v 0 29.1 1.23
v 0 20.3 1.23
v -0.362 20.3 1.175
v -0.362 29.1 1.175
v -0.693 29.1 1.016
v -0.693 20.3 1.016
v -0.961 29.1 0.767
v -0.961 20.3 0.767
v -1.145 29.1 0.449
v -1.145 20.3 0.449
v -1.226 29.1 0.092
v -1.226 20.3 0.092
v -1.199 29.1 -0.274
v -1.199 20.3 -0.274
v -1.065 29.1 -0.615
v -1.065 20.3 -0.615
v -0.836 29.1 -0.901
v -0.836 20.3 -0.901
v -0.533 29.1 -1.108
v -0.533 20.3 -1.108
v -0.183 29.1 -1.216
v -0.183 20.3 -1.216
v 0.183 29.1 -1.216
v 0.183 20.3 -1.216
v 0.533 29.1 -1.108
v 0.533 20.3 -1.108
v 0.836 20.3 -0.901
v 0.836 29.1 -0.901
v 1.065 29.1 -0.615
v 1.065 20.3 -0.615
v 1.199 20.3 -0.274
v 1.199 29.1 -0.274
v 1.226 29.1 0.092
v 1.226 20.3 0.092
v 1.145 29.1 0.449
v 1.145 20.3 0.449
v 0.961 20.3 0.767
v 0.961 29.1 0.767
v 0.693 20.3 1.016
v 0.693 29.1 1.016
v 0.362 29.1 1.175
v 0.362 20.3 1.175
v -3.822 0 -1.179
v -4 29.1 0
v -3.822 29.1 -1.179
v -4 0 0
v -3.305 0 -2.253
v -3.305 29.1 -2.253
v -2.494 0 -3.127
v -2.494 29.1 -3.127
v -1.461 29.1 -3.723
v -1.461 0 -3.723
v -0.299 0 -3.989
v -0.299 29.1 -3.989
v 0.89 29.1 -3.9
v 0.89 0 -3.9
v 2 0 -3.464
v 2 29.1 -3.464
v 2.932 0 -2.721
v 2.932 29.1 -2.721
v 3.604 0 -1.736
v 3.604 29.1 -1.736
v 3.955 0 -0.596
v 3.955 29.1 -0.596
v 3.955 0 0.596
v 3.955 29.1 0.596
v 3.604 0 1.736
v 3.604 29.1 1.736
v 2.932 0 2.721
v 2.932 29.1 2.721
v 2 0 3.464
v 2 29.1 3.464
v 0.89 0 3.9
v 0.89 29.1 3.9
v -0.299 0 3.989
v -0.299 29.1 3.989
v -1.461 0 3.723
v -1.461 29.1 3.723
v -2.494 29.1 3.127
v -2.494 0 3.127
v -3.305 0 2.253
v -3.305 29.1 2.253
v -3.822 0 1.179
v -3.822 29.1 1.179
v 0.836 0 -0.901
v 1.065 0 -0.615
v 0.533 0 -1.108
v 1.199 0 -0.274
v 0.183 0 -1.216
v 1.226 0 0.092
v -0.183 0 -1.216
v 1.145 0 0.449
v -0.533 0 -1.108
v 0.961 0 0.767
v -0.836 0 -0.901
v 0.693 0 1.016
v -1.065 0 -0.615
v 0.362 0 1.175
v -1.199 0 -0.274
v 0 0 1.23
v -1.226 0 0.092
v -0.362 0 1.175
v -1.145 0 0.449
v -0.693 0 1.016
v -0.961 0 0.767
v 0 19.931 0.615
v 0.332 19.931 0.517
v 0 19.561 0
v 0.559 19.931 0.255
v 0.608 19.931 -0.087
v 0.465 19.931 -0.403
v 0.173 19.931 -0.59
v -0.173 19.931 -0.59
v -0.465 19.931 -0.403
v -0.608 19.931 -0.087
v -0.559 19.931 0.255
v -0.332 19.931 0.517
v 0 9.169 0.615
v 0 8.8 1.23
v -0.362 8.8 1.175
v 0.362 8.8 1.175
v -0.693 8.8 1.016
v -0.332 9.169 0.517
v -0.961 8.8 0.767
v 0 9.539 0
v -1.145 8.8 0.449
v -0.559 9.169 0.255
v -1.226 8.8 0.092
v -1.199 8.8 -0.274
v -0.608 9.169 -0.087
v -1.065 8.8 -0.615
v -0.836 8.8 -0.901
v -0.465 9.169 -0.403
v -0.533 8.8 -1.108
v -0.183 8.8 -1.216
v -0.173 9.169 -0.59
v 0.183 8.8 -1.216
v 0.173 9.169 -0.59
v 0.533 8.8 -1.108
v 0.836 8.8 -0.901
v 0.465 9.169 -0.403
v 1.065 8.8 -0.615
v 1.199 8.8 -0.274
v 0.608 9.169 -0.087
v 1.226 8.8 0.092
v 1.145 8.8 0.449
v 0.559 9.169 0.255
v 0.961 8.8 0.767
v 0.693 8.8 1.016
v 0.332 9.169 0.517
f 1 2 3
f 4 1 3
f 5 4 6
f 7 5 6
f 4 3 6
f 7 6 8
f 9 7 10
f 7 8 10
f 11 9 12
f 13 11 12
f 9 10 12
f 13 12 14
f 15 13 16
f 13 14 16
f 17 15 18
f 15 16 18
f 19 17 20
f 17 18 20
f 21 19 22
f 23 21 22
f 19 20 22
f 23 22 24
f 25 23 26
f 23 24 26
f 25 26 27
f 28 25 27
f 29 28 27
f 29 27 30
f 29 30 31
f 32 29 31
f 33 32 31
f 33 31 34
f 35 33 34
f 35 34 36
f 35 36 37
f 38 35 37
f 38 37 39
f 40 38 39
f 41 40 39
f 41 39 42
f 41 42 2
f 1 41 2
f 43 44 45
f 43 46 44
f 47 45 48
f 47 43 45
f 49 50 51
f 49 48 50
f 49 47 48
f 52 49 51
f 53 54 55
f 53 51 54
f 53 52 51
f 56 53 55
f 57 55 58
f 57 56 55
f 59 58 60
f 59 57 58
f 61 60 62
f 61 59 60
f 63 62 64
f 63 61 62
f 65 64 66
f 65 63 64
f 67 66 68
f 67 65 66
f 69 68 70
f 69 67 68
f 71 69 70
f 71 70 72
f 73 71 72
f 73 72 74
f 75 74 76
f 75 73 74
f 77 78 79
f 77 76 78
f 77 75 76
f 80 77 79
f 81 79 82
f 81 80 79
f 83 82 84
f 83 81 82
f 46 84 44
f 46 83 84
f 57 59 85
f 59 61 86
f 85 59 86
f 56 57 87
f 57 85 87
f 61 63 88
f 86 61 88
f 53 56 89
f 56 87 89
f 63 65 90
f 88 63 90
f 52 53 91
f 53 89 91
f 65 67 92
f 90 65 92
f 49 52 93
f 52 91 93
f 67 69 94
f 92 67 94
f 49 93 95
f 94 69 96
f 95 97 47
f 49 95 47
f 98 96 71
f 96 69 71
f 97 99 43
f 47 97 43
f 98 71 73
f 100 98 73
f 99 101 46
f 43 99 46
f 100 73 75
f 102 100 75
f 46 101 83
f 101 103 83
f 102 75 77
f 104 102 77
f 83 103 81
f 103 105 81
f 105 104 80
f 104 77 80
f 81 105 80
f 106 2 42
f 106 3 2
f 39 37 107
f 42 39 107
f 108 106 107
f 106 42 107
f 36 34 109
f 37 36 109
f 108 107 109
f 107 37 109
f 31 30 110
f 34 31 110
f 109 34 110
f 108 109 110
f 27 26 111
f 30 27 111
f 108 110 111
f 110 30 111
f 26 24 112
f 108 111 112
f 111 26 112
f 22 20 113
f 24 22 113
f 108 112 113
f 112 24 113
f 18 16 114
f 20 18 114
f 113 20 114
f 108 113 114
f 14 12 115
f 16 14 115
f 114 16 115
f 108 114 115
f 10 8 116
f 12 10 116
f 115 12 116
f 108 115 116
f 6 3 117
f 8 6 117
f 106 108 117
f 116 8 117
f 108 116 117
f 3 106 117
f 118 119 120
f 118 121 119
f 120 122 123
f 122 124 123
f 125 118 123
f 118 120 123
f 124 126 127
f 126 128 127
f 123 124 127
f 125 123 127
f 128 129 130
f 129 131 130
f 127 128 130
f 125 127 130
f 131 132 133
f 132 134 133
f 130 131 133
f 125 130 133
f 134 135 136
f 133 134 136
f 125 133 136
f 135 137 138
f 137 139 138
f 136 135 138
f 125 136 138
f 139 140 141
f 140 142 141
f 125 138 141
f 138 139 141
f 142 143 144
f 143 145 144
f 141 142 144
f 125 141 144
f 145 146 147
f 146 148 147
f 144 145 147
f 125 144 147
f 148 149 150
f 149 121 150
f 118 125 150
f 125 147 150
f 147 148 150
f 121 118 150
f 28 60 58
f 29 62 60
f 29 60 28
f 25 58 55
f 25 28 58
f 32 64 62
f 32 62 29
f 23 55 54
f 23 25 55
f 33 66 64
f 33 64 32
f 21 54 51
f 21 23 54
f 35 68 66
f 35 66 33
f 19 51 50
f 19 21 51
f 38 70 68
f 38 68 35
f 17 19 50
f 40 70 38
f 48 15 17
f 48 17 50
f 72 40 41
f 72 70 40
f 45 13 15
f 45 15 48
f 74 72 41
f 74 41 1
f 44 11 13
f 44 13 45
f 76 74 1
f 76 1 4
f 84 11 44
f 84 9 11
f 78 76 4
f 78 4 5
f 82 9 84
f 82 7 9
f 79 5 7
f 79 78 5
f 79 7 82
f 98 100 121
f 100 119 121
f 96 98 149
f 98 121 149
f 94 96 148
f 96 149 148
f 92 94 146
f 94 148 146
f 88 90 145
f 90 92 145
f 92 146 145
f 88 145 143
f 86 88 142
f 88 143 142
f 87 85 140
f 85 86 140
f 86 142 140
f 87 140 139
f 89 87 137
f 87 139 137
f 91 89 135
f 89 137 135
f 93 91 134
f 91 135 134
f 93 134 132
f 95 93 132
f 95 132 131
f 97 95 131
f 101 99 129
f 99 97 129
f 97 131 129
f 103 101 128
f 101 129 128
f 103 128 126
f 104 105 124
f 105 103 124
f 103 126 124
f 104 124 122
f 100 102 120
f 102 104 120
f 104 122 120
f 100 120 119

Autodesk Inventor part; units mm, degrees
ref_plane "YZ Plane" through (0, 0, 0) normal (1, 0, 0) x (0, 1, 0)
ref_plane "XZ Plane" through (0, 0, 0) normal (0, 1, 0) x (-1, 0, 0)
sketch "Sketch1" plane through (0, 0, 0) normal (0, 1, 0) x (-1, 0, 0)
  circle A0 centre (0, 0) radius 4
  dimension "d0" = 8
extrude "Extrusion1" add sketch "Sketch1" along normal blind 29.1
sketch "Sketch2" plane through (0, 29.1, 0) normal (0, 1, 0) x (1, 0, 0)
  point P0 (0, 0)
  point P1 (0, 0)
hole "Hole1" at (0, 29.1, 0) direction (0, -1, 0) diameter 2.459 depth 8.8 tip angle 118 thread size "M3x0.5" class "6H" standard "ISO Metric profile"
ref_plane "Work Plane1" through (0, 14.55, 0) normal (0, 1, 0) x (1, 0, 0)
mirror "Mirror1" about plane through (0, 14.55, 0) normal (0, 1, 0) of "Hole1"
properties part number "rod mount motor"
